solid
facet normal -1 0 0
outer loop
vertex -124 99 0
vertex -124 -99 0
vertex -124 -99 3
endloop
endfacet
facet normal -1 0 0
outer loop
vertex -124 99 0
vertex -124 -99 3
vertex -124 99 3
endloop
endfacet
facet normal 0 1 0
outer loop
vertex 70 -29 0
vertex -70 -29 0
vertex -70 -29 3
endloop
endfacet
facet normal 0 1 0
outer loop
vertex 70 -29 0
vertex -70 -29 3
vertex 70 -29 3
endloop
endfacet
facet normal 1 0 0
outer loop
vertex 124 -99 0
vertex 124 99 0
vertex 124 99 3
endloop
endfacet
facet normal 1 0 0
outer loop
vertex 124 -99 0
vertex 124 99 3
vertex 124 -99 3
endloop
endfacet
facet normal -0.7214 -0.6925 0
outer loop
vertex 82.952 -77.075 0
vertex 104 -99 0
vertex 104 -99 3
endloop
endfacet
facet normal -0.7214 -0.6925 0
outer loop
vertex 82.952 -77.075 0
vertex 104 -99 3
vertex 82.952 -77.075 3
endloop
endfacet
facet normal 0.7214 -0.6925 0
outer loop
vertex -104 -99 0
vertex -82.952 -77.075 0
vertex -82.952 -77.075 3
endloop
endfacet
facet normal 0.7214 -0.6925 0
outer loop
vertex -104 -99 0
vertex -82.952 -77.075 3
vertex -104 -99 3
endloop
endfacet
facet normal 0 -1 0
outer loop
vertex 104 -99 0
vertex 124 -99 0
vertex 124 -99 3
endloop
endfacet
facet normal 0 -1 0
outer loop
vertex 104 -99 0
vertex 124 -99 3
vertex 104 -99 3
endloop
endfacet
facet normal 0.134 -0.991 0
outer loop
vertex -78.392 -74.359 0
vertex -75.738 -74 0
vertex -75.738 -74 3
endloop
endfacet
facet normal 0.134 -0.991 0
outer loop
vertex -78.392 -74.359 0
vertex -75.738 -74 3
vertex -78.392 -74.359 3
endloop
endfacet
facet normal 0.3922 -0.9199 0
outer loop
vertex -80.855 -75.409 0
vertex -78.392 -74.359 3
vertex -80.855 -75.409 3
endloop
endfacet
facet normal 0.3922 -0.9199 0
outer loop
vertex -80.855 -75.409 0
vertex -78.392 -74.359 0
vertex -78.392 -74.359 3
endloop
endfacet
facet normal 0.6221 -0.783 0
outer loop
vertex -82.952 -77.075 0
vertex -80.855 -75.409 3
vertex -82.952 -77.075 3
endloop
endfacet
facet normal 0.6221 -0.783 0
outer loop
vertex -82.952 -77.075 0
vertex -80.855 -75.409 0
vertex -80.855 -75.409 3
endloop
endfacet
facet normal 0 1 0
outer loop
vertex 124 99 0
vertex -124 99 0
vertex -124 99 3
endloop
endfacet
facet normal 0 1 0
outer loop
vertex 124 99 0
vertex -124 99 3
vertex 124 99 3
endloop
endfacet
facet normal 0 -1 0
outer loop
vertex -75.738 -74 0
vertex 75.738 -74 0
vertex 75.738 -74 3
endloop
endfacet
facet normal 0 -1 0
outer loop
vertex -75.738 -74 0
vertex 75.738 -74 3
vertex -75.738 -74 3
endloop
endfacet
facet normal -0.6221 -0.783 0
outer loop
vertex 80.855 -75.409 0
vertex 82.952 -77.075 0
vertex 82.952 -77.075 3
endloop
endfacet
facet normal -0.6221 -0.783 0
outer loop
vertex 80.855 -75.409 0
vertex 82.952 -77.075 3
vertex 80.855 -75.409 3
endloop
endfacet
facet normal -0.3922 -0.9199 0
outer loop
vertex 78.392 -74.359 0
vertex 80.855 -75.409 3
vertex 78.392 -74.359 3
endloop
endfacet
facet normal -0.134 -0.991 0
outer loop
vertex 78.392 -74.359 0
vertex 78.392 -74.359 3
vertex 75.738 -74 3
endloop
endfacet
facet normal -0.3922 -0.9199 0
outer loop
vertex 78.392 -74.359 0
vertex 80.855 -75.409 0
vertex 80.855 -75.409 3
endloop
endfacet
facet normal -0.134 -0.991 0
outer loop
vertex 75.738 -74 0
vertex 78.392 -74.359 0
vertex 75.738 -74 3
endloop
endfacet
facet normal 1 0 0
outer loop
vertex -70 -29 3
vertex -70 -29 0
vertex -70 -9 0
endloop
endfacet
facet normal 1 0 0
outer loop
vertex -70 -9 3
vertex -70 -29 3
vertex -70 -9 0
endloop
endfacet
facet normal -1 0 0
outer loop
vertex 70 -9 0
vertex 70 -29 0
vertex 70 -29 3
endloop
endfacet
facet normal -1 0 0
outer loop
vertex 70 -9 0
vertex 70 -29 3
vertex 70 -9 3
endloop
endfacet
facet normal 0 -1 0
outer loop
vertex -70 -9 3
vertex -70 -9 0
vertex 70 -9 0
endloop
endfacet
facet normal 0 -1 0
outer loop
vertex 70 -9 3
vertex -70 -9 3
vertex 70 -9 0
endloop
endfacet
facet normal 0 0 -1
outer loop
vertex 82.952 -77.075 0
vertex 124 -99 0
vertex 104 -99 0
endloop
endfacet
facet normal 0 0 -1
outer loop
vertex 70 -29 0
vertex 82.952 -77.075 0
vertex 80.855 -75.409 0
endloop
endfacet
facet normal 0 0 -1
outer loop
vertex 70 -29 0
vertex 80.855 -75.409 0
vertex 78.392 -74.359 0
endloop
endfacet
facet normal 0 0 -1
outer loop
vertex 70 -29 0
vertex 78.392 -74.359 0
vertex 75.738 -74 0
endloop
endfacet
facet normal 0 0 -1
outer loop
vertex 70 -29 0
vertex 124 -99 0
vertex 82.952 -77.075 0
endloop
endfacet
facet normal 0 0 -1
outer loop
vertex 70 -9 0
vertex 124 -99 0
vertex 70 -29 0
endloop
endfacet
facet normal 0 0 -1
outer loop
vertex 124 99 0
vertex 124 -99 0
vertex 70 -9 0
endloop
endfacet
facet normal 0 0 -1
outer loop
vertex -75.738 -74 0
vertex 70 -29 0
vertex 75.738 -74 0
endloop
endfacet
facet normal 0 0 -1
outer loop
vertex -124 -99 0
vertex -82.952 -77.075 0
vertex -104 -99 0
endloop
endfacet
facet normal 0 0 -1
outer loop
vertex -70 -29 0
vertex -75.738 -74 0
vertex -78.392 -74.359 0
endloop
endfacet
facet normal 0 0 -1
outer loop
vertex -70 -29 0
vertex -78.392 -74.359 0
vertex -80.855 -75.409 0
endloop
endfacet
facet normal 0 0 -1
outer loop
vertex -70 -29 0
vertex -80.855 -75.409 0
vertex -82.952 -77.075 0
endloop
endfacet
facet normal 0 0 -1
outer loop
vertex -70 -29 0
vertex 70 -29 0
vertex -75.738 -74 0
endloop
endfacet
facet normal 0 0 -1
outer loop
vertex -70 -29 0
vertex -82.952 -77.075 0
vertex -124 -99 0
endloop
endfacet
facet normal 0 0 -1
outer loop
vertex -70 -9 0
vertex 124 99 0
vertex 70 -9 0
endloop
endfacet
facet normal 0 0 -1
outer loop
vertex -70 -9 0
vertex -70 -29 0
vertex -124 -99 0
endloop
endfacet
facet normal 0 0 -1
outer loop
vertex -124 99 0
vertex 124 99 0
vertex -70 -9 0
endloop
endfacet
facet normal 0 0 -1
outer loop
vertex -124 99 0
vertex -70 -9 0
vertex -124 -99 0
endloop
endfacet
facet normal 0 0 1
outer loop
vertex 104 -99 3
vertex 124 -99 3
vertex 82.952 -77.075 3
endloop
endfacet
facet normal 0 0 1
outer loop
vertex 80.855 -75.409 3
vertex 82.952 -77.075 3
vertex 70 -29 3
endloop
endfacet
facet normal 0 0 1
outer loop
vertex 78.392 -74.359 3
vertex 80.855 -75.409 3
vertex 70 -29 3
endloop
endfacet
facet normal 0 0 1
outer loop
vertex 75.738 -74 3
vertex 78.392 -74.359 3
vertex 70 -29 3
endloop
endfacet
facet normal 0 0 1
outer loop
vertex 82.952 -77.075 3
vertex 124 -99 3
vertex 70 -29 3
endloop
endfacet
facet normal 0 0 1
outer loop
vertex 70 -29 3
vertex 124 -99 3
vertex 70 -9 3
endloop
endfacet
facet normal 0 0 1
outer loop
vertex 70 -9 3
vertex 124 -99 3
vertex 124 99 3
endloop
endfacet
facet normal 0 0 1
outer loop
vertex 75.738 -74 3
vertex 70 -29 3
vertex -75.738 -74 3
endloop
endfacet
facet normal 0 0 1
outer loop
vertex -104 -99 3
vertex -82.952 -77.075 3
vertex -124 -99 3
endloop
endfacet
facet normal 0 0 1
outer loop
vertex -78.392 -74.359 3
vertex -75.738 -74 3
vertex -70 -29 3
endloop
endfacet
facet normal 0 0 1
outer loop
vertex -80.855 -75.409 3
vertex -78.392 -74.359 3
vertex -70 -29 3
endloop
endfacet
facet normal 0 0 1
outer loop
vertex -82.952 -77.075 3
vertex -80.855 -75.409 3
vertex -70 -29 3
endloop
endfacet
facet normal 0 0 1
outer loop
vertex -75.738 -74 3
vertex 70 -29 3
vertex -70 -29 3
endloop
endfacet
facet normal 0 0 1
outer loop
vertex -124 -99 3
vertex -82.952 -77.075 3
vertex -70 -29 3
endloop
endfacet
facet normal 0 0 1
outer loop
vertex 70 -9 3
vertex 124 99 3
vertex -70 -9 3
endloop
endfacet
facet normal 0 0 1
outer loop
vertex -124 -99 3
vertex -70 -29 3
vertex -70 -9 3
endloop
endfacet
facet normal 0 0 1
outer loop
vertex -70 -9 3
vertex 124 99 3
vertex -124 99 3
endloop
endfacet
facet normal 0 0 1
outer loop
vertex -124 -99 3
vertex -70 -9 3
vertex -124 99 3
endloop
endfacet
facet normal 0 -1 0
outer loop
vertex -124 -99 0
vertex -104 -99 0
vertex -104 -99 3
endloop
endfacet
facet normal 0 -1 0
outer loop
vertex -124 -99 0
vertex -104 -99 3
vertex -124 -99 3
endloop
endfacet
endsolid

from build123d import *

# Parameters (mm, degrees)
SKETCH1_W           = 140
SKETCH1_H           = 20
BOSS_EXTRUDE1_DEPTH = 3


with BuildPart() as part:
    # Sketch1 → Boss-Extrude1 (new body)
    with BuildSketch(Plane.XY):
        with BuildLine():
            Line((-124, -99), (-124, 99))
            Line((-124, 99), (124, 99))
            Line((124, 99), (124, -99))
            Line((124, -99), (104, -99))
            Line((104, -99), (82.951694449, -77.074681718))
            ThreePointArc((82.951694449, -77.074681718), (79.65871509, -74.800728757), (75.737821239, -74))
            Line((75.737821239, -74), (-75.737821239, -74))
            ThreePointArc((-75.737821239, -74), (-79.65871509, -74.800728757), (-82.951694449, -77.074681718))
            Line((-82.951694449, -77.074681718), (-104, -99))
            Line((-104, -99), (-124, -99))
        make_face()
        with Locations((0, -19)):
            Rectangle(SKETCH1_W, SKETCH1_H, mode=Mode.SUBTRACT)
    extrude(amount=BOSS_EXTRUDE1_DEPTH)


solid = part.part
